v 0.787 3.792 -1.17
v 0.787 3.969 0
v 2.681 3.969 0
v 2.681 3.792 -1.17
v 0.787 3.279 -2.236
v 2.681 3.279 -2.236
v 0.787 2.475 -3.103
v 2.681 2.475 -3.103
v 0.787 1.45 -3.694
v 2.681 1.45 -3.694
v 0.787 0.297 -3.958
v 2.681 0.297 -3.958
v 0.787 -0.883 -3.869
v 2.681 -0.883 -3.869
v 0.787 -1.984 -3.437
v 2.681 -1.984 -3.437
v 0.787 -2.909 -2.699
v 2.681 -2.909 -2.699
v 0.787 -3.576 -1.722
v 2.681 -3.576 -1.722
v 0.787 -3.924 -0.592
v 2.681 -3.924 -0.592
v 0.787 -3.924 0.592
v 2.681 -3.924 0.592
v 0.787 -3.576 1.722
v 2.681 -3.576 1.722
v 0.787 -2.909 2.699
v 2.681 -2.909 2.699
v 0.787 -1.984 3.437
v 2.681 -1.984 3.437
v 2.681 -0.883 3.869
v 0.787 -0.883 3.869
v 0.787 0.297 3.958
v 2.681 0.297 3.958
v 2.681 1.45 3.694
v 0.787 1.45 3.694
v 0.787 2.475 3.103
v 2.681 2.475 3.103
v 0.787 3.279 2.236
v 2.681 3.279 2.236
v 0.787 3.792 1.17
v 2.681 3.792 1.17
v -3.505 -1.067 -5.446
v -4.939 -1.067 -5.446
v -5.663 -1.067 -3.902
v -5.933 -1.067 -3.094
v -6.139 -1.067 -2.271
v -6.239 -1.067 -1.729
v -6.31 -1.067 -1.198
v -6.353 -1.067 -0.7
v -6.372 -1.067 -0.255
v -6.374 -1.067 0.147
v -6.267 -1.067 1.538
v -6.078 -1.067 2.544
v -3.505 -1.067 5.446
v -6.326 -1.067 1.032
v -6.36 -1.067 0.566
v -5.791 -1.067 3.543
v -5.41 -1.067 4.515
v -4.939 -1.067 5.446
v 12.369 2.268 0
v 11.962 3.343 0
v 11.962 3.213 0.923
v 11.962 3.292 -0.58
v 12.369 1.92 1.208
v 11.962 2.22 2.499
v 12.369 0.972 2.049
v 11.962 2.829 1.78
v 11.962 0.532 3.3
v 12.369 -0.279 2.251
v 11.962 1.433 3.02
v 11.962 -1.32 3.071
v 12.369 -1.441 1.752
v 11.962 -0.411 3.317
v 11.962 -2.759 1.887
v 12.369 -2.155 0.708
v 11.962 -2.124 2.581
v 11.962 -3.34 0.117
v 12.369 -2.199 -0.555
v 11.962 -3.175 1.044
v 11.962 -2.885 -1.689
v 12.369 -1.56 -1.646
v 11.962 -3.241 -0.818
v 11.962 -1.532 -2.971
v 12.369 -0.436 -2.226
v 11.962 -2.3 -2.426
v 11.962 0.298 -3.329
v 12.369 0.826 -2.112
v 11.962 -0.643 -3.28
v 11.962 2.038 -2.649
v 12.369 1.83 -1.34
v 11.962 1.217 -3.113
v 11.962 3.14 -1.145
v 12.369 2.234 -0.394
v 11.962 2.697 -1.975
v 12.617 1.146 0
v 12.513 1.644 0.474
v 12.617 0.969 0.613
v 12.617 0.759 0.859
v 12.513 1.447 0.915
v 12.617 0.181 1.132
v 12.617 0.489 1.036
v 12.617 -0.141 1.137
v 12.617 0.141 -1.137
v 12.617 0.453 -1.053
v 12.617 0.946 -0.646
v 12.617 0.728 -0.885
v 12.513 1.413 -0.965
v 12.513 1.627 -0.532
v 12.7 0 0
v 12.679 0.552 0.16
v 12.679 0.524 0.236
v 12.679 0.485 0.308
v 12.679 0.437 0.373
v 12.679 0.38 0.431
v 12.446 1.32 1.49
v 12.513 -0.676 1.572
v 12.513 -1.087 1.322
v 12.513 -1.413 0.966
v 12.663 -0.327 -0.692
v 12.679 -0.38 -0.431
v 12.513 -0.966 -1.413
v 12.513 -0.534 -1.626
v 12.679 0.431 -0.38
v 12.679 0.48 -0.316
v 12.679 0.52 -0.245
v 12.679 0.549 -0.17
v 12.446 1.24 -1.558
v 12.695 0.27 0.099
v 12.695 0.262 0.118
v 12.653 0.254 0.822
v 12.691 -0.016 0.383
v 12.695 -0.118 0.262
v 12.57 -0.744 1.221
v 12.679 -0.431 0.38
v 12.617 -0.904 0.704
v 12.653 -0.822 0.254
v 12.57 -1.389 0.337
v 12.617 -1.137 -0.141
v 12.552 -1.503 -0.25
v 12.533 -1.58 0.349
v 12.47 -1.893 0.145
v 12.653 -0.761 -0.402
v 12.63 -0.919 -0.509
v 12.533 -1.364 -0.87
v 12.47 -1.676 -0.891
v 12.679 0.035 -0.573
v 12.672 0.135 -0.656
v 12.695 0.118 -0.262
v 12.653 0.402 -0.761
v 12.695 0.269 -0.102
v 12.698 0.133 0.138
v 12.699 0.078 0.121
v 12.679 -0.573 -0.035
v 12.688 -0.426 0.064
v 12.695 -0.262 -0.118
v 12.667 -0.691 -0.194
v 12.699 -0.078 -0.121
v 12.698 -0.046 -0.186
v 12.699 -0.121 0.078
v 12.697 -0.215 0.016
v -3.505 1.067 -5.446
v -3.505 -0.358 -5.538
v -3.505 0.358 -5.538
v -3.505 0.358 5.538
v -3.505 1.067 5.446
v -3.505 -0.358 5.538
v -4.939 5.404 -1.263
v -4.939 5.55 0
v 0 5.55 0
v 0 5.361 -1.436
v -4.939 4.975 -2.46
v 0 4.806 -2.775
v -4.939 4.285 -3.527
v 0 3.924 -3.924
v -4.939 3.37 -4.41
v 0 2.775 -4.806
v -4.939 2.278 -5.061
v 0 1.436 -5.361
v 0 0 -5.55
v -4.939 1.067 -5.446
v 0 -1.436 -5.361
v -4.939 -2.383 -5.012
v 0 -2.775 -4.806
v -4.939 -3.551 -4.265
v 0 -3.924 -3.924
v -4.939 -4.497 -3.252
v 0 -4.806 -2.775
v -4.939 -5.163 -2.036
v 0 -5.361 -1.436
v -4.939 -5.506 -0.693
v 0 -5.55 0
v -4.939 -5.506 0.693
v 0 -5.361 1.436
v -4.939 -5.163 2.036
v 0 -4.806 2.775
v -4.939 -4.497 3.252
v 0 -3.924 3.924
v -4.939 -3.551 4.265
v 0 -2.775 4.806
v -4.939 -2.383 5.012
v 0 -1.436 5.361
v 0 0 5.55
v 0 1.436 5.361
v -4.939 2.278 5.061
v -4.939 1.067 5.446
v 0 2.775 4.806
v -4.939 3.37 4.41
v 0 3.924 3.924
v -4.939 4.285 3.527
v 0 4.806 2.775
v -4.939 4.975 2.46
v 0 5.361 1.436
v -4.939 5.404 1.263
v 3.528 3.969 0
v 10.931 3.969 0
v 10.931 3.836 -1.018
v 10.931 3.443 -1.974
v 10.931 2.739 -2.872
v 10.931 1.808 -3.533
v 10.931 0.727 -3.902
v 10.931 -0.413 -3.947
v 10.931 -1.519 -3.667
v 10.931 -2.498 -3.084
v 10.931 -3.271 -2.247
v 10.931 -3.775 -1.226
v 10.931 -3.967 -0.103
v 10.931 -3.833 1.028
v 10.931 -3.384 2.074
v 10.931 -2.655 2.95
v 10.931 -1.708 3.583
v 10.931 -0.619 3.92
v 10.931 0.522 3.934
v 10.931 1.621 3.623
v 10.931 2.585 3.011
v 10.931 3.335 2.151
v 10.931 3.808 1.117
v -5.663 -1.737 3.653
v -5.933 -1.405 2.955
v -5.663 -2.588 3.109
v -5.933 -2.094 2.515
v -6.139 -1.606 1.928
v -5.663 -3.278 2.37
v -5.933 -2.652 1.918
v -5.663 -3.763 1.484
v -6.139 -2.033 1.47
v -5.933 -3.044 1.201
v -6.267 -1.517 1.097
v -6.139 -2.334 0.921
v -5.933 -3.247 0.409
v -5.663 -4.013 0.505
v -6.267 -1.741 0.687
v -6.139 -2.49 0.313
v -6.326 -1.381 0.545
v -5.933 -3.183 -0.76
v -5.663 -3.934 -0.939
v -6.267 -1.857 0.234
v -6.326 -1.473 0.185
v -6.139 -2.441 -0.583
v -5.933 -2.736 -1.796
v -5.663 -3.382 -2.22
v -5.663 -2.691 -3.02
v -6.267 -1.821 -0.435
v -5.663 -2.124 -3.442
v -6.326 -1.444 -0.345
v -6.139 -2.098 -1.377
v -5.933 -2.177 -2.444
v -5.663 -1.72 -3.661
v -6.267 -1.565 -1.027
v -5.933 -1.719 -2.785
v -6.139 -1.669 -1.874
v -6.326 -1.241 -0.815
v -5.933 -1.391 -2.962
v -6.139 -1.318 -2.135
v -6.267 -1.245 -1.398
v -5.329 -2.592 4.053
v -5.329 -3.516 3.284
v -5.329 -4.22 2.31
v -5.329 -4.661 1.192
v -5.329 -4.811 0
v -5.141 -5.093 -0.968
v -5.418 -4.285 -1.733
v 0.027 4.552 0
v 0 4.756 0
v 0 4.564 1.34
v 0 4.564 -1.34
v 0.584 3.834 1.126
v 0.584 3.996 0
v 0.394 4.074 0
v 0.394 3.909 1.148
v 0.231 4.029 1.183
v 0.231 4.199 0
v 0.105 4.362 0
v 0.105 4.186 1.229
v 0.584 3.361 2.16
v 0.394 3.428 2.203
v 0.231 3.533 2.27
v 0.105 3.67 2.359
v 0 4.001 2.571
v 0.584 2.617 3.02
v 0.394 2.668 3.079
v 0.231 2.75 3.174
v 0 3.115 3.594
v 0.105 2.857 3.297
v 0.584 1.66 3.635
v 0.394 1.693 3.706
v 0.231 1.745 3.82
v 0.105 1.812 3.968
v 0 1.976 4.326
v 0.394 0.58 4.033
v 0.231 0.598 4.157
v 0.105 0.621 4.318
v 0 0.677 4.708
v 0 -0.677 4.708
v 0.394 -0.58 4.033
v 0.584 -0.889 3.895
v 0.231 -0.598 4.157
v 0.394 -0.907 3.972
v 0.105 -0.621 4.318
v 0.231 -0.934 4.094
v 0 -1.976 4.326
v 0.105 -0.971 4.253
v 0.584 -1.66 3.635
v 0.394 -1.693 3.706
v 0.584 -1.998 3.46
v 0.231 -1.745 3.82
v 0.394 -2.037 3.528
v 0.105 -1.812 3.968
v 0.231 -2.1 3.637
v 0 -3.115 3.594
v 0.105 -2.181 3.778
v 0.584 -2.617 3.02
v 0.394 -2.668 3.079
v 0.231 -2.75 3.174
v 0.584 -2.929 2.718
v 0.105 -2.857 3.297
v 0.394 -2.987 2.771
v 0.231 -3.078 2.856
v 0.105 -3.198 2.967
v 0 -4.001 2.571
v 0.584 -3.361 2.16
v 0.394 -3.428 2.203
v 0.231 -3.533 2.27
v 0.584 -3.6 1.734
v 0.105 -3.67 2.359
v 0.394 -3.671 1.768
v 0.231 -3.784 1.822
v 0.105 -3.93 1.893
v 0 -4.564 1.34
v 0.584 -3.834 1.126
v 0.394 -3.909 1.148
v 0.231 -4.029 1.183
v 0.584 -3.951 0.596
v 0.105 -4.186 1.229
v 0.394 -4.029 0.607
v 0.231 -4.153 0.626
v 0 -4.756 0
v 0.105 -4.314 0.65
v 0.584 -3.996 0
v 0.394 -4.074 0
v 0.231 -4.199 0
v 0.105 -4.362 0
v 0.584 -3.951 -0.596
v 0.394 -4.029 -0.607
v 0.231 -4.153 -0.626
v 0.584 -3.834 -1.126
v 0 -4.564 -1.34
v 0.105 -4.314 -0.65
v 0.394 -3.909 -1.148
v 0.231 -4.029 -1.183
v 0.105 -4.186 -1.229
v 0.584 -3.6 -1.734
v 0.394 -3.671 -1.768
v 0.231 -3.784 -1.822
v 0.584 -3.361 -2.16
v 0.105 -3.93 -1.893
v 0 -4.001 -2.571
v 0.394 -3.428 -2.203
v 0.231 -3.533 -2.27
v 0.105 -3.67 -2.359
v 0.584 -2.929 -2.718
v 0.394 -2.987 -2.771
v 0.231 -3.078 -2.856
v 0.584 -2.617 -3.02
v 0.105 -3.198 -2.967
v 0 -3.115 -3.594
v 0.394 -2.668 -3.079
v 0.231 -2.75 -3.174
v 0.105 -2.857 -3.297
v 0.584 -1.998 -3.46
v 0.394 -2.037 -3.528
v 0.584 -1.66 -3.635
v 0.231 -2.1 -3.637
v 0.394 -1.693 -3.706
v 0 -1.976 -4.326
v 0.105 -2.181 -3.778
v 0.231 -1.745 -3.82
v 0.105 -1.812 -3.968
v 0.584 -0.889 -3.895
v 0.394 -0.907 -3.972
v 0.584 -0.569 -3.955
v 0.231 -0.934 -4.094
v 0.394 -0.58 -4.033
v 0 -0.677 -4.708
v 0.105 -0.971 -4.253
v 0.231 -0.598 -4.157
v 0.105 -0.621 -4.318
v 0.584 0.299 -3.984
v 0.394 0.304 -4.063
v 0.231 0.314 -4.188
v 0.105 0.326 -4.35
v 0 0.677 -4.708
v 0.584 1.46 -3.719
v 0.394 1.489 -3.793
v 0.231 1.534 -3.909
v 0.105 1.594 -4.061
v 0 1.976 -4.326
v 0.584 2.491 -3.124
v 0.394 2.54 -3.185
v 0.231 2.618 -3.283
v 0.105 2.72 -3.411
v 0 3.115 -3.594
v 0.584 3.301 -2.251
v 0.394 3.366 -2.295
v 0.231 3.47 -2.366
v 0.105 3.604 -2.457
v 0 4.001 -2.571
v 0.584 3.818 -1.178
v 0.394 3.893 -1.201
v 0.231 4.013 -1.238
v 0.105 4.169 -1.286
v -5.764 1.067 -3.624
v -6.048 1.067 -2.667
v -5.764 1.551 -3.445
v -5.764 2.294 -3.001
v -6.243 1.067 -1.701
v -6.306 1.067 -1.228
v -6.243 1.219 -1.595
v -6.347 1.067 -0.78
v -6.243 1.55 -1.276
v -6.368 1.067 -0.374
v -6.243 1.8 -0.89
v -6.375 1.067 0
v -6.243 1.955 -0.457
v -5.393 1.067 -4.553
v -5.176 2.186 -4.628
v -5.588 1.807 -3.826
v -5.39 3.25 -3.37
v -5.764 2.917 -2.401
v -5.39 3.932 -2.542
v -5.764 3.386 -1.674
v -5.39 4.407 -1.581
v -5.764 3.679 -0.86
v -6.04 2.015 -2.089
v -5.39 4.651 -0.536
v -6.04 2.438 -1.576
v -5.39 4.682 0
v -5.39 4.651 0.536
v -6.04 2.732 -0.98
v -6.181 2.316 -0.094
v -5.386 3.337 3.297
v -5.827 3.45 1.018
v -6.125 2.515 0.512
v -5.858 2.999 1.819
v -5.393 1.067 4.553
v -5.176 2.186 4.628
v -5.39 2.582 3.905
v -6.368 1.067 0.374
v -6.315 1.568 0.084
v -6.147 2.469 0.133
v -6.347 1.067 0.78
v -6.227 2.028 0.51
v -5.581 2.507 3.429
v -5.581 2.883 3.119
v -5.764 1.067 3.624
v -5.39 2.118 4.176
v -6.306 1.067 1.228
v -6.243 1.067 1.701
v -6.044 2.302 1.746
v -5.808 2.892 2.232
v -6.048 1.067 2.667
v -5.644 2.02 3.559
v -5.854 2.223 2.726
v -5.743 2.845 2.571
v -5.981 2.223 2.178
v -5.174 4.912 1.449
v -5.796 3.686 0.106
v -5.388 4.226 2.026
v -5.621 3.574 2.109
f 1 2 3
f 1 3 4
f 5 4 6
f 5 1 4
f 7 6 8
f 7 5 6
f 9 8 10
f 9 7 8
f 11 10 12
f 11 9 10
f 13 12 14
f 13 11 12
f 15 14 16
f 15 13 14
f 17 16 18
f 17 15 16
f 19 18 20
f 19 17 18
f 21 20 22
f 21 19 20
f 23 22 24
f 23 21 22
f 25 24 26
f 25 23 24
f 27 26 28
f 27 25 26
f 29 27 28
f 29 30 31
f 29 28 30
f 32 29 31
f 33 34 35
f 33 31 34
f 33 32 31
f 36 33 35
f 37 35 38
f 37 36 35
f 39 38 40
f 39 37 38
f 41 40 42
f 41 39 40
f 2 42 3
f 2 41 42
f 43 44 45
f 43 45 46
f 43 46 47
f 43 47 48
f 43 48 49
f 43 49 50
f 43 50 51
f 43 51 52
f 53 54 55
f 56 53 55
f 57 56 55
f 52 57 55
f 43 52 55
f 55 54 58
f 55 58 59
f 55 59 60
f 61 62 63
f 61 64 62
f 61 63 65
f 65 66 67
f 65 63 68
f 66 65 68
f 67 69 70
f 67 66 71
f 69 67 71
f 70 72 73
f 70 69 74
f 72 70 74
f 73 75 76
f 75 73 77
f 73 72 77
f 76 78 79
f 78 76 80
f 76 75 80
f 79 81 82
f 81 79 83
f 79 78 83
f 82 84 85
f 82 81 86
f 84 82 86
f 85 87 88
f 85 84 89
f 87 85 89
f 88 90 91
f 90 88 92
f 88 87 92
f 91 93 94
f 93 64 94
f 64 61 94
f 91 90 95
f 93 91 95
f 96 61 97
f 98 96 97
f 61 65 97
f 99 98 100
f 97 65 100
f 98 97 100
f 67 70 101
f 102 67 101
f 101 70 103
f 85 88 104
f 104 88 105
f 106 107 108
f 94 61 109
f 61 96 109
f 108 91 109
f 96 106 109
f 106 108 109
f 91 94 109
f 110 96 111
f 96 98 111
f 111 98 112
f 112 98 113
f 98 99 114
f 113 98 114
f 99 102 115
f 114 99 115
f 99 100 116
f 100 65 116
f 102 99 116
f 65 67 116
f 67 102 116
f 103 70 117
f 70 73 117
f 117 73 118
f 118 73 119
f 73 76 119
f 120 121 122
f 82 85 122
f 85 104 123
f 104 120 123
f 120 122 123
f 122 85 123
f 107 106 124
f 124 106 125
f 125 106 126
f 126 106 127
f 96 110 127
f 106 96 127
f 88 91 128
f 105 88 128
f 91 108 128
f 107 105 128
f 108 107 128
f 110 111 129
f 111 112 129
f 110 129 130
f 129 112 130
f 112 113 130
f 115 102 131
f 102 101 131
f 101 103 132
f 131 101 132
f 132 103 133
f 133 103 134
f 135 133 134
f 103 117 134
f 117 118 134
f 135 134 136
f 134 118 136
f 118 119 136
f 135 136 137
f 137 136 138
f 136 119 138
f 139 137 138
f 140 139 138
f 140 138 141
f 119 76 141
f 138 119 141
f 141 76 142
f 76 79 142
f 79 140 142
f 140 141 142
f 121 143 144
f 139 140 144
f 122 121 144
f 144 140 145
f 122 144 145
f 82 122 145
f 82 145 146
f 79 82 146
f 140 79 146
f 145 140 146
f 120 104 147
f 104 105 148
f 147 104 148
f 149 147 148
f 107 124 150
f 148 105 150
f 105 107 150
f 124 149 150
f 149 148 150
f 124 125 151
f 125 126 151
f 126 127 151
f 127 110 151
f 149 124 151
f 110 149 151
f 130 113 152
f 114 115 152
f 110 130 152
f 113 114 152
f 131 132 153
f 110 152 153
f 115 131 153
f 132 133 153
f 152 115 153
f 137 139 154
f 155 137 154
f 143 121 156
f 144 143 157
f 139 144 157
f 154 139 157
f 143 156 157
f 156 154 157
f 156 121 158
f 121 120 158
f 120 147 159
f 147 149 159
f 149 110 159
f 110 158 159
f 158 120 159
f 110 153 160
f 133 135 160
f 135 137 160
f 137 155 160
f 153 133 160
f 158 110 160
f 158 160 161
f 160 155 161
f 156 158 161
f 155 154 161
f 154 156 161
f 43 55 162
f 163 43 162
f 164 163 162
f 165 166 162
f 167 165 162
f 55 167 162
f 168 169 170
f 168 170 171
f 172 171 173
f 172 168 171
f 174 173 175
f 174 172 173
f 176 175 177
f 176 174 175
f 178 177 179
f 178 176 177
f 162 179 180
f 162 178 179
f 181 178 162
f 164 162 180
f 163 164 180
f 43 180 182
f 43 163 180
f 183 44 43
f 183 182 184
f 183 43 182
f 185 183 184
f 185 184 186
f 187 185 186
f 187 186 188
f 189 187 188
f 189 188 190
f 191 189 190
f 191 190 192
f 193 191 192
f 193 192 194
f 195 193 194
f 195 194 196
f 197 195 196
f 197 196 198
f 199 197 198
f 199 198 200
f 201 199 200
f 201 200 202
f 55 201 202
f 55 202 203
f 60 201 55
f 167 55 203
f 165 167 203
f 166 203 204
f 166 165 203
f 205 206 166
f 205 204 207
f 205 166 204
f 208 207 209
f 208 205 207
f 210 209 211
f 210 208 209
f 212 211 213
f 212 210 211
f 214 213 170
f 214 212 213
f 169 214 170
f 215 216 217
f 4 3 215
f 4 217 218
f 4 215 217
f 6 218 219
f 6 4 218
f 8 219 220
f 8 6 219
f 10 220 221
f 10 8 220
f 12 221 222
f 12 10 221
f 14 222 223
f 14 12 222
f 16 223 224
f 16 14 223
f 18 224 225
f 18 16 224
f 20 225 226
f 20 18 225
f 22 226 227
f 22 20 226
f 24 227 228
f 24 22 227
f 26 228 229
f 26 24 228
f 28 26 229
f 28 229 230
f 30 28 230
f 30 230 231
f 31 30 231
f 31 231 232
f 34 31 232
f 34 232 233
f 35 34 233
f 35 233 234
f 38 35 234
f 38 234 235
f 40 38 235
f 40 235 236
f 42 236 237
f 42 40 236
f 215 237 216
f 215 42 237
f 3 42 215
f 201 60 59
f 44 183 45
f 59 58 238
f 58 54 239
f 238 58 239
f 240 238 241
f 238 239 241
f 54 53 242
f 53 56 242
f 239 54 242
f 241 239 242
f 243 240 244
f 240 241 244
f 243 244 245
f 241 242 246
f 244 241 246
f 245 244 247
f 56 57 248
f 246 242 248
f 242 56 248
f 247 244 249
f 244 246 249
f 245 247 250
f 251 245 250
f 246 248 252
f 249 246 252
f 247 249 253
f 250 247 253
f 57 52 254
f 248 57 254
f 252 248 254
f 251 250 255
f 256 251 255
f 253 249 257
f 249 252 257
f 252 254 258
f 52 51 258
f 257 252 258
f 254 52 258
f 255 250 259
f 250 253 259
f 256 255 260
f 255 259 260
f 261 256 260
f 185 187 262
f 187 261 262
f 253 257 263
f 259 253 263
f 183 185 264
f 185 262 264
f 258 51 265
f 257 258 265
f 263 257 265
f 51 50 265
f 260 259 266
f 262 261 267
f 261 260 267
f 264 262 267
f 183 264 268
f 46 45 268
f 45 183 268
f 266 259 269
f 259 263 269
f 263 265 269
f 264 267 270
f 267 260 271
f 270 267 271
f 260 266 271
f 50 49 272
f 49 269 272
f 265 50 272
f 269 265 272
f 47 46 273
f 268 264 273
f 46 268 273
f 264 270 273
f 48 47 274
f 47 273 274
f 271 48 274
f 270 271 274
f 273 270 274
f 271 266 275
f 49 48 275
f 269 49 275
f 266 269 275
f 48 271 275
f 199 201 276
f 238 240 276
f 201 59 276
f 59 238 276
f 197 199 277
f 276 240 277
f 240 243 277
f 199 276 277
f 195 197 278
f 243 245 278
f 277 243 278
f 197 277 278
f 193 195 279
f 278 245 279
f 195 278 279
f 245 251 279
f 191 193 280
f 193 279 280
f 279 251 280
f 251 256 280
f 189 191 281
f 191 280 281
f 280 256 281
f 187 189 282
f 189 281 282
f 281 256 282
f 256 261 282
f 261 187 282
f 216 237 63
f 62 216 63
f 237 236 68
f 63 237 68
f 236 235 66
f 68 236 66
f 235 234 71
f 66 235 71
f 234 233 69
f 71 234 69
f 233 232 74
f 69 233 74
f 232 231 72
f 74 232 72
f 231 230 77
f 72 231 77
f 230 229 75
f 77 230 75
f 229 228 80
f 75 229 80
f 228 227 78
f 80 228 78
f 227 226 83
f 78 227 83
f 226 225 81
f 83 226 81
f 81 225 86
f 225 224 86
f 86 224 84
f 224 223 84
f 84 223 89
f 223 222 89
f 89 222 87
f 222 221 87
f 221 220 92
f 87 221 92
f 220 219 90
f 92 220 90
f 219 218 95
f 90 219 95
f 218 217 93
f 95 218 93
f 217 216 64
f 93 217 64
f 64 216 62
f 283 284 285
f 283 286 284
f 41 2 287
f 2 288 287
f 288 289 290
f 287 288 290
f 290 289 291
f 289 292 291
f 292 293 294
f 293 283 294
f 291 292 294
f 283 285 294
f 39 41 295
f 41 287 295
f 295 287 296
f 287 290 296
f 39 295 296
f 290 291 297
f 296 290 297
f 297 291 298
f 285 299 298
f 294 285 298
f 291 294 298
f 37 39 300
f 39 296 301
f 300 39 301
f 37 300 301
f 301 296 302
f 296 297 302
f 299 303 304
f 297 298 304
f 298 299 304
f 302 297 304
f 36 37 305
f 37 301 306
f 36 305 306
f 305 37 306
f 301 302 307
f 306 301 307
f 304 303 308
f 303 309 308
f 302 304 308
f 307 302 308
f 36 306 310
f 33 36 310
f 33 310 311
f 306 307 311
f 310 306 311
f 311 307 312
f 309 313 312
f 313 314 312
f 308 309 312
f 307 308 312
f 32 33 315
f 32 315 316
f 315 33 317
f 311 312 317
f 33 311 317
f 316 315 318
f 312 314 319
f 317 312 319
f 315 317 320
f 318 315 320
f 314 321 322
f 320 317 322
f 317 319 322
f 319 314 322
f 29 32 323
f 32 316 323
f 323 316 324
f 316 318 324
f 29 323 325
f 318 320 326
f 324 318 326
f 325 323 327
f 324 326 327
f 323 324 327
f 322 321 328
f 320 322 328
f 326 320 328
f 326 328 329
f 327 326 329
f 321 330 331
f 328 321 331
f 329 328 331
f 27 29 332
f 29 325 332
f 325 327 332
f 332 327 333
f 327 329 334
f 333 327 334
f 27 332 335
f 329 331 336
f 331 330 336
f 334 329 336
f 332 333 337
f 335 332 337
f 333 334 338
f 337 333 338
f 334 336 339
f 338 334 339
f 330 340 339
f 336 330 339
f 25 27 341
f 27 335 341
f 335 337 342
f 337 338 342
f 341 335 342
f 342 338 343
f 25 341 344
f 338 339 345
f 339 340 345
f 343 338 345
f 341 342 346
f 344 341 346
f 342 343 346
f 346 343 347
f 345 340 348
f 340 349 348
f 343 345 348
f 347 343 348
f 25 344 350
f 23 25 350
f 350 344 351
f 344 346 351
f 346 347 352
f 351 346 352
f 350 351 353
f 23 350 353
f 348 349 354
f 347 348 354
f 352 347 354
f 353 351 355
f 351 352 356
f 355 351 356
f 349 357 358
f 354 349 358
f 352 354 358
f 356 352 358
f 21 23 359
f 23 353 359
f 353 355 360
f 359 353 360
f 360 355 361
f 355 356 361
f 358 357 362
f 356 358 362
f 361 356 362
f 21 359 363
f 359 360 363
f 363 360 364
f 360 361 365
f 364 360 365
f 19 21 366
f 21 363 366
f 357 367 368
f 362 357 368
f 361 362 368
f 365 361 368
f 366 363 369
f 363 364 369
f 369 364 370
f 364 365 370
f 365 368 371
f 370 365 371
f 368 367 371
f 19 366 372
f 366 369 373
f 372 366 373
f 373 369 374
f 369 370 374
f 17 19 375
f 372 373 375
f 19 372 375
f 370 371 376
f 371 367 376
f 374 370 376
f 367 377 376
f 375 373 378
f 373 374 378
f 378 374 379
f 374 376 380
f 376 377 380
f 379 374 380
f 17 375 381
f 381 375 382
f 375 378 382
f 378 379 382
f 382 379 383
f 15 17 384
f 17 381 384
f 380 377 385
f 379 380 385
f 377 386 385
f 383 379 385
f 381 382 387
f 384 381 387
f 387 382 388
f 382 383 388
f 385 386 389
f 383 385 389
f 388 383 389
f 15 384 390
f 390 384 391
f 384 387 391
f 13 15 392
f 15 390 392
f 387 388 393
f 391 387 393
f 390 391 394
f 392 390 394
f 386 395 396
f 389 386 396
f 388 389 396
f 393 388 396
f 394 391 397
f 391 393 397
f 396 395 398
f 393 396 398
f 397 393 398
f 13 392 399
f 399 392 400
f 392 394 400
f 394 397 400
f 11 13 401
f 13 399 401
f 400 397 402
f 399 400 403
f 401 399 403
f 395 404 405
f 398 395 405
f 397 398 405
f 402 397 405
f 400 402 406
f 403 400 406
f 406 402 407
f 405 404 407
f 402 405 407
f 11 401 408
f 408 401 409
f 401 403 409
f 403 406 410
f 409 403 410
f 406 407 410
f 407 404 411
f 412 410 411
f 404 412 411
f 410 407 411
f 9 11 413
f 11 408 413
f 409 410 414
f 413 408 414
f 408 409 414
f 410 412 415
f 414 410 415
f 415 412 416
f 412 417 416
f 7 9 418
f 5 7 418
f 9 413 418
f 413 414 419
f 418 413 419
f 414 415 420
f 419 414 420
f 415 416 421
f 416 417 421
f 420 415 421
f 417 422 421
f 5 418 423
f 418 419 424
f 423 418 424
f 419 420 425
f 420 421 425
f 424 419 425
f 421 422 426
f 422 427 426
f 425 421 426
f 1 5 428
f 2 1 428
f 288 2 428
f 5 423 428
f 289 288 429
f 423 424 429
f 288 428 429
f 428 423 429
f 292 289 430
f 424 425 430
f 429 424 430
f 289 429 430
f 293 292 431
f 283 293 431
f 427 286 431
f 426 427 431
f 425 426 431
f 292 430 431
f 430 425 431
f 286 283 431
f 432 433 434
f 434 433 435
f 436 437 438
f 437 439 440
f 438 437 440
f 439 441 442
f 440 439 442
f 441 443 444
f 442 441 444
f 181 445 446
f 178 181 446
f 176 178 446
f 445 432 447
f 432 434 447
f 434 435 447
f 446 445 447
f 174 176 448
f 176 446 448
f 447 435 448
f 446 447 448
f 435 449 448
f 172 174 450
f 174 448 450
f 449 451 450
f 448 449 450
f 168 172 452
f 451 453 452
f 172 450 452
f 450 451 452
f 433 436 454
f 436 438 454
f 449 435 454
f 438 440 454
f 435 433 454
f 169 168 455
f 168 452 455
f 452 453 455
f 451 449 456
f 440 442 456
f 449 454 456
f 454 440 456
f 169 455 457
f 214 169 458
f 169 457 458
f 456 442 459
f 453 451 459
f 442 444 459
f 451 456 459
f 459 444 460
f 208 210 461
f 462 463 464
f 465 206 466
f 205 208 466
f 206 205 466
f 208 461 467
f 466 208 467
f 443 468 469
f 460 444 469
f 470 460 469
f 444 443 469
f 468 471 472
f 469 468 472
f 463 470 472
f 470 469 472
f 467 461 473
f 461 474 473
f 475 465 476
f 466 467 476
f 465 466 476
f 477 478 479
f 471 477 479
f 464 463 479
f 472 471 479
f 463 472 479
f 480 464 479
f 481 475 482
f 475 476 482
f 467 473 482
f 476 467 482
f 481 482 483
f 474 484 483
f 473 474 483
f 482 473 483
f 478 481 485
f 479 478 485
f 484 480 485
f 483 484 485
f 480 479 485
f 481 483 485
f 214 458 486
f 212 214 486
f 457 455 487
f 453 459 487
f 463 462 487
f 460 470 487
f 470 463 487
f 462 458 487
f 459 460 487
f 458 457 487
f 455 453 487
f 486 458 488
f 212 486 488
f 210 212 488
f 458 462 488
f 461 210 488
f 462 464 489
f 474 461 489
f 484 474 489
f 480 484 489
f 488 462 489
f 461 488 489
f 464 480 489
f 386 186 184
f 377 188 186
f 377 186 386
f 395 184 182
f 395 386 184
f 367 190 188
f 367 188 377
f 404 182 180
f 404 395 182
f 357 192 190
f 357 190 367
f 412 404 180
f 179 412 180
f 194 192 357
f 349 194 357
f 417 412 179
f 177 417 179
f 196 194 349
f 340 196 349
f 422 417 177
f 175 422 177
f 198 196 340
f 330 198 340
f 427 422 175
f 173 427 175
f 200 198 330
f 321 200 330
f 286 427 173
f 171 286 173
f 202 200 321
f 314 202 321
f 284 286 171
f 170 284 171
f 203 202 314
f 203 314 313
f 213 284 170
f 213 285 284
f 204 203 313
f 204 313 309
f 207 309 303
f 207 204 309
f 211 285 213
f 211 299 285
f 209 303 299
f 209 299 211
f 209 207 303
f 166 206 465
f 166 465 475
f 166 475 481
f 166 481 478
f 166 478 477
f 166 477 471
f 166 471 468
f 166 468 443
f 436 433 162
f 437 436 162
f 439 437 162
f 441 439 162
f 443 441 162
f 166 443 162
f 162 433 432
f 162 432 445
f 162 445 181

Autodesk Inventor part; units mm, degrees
ref_plane "YZ Plane" through (0, 0, 0) normal (1, 0, 0) x (0, 1, 0)
sketch "Szkic1" plane through (0, 0, 0) normal (0, 0, 1) x (1, 0, 0)
  line L0 (-6.4262, 0) -> (12.7, 0)
  line L1 (12.7, 0) -> (12.7, 3.9687)
  line L2 (12.7, 3.9687) -> (3.5281, 3.9687)
  line L3 (3.5281, 3.9687) -> (2.6812, 3.9688)
  line L4 (2.6812, 3.9688) -> (0, 3.9688)
  line L5 (0, 3.9688) -> (0, 5.5499)
  line L6 (-10.6898, 0) -> (16.5983, 0) projected
  line L7 (0, -1.1296) -> (0, 6.7773) projected
  line L8 (0, 5.5499) -> (-4.9391, 5.5499)
  arc A0 (-4.9391, 5.5499) -> (-6.4262, 0) centre (4.6736, 0) ccw
  line L9 (3.5281, 3.9687) -> (0, 3.9687) construction
  dimension "d0" = 12.7
  dimension "d1" = 9.1719
  dimension "d2" = 0.8468
  dimension "d3" = 6.4262
  dimension "d4" = 7.9375
  dimension "d5" = 7.9375
  dimension "d9" = 11.0998
  dimension "d10" = 0
  dimension "d13" = 11.0998
revolve "Bryła" add sketch "Szkic1" angle 360 about axis through (-6.4262, 0, 0) along (1, 0, 0)
ref_plane "IDS_WORKPLANE{1}" through (-6.4262, 0, 0) normal (1, 0, 0) x (0, 0, -1)
sketch "Szkic2" plane through (-6.4262, 0, 0) normal (1, 0, 0) x (0, 0, -1)
  circle A0 centre (0, 0) radius 5.5499 projected
  line L0 (0, -7.7699) -> (0, 7.7699) projected
  line L1 (7.7699, 0) -> (-7.7699, 0) projected
  line L2 (-5.5499, 1.0668) -> (5.5499, 1.0668)
  line L3 (5.5499, 1.0668) -> (5.5499, -1.0668)
  line L4 (5.5499, -1.0668) -> (-5.5499, -1.0668)
  line L5 (-5.5499, -1.0668) -> (-5.5499, 1.0668)
  line L6 (-5.5499, 0) -> (5.5499, 0) construction
  line L7 (0, 1.0668) -> (0, -1.0668) construction
  dimension "d15" = 2.1336
extrude "Szczelina" cut sketch "Szkic2" along normal blind 2.921 contours L1 L0 L2 A0 | L3 L4 A0 | A0 L4 L0 L1 | A0 L2 L3 | L1 A0 L2 L0 | L0 L4 A0 L1 | L5 L2 A0 | A0 L4 L5
thread "Gwint" size "5/16-18 UNC" class "2A" standard "ANSI Unified Screw Threads" length 9.1719
sketch "Szkic3" plane through (0, 0, 0) normal (0, 0, 1) x (1, 0, 0)
  line L0 (12.7, 0) -> (12.7, 3.9687) projected
  line L1 (12.7, 3.9687) -> (3.5281, 3.9687) projected
  line L2 (-6.4262, 0) -> (12.7, 0) projected
  arc A0 (12.7, 0) -> (11.6366, 3.9687) centre (4.7625, 0) ccw
  line L3 (12.7, -3.9687) -> (12.7, 3.9687) projected
  line L4 (11.6366, 3.9687) -> (11.6366, 0)
  line L5 (11.6366, 0) -> (12.7, 0)
  dimension "d40" = 7.9375
revolve "Zaokrąglenie1" cut sketch "Szkic3" angle 360 about axis through (-6.4262, 0, 0) along (1, 0, 0) contours A0 L1 L0
chamfer "Faza" distance 0.7056 angle 45 1 edges at (11.6366, -3.9687, 0)
ref_plane "Work Plane2" through (41.275, 0, 0) normal (0, 0, -1) x (1, 0, 0)
fillet "Zaokrąglenie4" radius 0.7874 1 edges at (0, -3.9688, 0)
equation "\"d0\" = NLG"
equation "\"d1\" = GEL"
equation "\"d2\" = GAL"
equation "\"d3\" = KOH"
equation "\"d4\" = GD"
equation "\"d5\" = BDM"
equation "\"d9\" = KOD"
equation "\"d13\" = KR"
equation "\"d15\" = SBR"
equation "\"d16\" = STI"
equation "\"d40\" = GD"
equation "\"d11\" = GEL"
equation "\"d43\" = 0.5 * RR"
equation "\"d46\" = R"
equation "\"GD\" = NND"
equation "\"NLG\" = 12.7"
equation "\"GEL\" = 9.17194"
equation "\"KOD\" = 11.0998"
equation "\"KOH\" = 6.4262"
equation "\"GAL\" = 0.84684"
equation "\"BDM\" = NND"
equation "\"SBR\" = 2.1336"
equation "\"STI\" = 2.921"
equation "\"KEWI\" = 0"
equation "\"KR\" = KOD"
equation "\"d14\" = -KOH"
equation "\"R\" = 0.7874"
equation "\"THREADDIA\" = 7.9375"
equation "\"TOA\" = 30deg"
equation "\"KOH1\" = 5.1562"
equation "\"NND\" = 7.9375"
equation "\"GD1\" = 6.25856"
equation "\"THREADDESC\" = 1.2345"
equation "\"RR\" = 1.411111"
properties part number "ANSI B18.6.2 - 5/16-18 UNC - 0,5" material "Stal, miękka"
